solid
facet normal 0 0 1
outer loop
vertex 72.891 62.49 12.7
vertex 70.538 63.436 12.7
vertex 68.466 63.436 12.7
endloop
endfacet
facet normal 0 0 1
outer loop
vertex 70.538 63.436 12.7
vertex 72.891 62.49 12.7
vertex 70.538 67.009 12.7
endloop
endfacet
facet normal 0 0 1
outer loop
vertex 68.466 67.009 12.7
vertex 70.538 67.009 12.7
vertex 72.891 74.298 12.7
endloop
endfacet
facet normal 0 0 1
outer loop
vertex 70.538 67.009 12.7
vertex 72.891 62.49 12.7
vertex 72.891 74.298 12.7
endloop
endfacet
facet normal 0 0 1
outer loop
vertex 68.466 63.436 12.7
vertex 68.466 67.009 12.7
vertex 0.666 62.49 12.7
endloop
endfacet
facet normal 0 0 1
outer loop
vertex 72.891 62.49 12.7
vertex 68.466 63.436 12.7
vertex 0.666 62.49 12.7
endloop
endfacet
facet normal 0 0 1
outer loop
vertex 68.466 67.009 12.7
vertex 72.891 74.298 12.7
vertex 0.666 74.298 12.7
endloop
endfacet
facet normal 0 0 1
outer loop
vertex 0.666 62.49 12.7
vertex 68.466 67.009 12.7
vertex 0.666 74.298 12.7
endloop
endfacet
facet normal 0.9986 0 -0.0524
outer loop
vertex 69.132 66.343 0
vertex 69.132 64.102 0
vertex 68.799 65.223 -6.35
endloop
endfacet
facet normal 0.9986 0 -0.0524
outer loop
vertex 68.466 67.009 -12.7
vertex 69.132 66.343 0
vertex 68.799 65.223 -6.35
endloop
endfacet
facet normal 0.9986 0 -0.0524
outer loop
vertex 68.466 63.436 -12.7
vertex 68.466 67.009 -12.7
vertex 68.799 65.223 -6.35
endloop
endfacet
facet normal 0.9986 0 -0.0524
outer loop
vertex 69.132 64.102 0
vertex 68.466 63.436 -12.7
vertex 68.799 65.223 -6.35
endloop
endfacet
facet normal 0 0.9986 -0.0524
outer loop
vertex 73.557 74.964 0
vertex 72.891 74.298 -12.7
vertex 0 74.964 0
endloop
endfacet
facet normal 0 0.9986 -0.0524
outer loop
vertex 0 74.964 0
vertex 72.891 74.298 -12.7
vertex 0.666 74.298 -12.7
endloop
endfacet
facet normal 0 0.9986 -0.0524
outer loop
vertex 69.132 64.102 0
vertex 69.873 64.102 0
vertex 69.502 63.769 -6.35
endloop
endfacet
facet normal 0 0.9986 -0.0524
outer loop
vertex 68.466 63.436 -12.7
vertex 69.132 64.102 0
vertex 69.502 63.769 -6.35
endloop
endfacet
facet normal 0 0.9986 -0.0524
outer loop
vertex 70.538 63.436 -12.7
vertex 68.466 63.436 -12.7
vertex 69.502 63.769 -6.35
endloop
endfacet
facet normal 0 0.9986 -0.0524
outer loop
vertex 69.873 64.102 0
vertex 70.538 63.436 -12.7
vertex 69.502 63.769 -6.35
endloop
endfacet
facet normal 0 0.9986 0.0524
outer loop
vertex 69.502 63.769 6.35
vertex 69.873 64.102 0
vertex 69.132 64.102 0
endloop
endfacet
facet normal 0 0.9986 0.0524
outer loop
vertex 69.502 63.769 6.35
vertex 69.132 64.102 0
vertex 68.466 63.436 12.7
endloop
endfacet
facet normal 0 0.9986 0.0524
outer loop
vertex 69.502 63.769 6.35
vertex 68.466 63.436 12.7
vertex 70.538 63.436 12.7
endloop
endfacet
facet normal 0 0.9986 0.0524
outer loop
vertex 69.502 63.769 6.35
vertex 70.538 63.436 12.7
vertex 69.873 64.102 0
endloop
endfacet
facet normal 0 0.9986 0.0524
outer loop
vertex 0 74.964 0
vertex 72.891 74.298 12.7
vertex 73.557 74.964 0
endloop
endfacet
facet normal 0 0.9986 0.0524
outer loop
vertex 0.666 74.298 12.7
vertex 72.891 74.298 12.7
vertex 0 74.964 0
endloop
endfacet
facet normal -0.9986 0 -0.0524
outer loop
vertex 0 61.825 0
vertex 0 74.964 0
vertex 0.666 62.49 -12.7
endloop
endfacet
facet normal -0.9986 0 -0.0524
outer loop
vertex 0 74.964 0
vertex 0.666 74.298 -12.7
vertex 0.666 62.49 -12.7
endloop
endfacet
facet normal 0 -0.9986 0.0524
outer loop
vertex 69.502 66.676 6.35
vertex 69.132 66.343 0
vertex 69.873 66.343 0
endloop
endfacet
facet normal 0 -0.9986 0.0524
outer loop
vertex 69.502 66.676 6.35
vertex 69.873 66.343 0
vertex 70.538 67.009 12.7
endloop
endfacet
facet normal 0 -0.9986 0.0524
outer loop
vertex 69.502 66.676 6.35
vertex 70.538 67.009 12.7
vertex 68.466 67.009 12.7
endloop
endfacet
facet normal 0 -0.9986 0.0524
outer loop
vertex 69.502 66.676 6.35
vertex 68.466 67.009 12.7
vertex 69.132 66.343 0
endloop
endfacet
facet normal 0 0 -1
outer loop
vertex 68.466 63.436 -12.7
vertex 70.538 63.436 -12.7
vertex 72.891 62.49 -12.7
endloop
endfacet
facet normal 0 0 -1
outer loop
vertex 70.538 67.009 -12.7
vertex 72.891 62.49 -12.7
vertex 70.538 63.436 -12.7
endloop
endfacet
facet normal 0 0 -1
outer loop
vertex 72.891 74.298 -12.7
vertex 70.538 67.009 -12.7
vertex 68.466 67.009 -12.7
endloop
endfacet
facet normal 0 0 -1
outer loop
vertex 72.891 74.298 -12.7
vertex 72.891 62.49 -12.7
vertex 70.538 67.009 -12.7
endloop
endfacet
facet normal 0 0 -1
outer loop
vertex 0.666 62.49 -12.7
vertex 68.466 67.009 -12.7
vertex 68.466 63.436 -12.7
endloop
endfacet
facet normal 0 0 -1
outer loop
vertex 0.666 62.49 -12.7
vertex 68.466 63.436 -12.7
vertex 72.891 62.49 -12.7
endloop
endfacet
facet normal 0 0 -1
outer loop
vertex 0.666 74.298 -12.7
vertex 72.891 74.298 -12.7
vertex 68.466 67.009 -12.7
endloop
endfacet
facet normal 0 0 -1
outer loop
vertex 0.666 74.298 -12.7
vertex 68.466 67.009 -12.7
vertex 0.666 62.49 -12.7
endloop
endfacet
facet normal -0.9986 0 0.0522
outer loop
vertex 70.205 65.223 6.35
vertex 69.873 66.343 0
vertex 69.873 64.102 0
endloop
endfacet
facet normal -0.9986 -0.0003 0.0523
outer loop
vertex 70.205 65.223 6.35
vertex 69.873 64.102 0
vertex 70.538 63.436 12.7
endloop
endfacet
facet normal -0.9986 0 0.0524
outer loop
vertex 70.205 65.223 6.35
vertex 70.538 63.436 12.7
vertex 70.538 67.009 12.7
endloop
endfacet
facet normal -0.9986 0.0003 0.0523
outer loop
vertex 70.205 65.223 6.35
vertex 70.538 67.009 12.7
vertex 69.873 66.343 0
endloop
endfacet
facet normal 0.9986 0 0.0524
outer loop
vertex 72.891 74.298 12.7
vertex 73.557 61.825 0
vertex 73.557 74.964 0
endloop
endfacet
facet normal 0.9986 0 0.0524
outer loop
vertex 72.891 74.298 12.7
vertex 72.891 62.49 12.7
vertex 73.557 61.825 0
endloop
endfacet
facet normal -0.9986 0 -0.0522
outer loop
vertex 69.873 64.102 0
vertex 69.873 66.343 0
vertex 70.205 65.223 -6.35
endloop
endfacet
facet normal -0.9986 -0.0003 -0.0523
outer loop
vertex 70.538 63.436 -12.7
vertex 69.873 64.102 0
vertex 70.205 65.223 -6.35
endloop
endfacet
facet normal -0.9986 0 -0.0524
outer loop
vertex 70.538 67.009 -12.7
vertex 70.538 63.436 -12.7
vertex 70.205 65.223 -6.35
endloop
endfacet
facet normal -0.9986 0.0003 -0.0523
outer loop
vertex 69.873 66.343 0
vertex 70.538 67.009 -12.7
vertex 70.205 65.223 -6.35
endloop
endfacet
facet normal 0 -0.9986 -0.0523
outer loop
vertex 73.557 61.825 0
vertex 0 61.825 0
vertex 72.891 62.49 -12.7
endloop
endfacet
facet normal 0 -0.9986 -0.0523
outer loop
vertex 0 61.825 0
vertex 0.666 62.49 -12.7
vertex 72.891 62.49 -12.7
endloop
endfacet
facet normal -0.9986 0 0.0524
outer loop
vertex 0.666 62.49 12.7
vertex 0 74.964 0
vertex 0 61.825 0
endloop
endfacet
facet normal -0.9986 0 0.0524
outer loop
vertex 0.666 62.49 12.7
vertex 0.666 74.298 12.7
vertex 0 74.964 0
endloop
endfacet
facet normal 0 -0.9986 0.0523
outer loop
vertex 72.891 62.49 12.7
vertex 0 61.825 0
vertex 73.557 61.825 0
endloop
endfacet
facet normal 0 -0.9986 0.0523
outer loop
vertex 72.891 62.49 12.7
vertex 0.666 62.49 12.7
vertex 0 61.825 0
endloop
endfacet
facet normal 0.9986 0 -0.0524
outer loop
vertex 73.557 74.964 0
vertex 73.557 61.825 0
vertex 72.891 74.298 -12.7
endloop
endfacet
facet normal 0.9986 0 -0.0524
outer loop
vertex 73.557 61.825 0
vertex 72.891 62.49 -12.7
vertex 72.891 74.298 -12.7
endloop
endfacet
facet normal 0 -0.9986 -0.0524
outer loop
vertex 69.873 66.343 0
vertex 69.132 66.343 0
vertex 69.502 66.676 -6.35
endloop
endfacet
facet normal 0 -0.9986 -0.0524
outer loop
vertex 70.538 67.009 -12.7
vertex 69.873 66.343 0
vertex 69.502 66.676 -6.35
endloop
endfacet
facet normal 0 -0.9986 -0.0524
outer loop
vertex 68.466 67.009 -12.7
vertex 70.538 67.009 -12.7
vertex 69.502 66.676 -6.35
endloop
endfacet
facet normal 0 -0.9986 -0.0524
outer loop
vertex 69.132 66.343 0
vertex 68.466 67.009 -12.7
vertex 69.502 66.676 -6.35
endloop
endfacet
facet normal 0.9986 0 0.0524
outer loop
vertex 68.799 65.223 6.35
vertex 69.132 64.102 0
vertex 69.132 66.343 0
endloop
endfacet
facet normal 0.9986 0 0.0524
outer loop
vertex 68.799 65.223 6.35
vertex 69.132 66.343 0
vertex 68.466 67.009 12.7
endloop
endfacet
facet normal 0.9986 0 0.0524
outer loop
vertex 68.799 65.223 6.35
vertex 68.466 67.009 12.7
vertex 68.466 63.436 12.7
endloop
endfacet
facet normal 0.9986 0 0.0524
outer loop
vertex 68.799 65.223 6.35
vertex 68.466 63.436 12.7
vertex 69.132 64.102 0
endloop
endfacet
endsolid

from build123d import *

# Parameters (mm, degrees)
F0_W     = 0.7410570979
F0_H     = 2.2417232394
F1_DEPTH = 12.7
F1_TAPER = 3


with BuildPart() as f1:
    # F0 (on Top) → F1 (new body, symmetric)
    with BuildSketch(Plane.XY):
        Polygon((65.8400952816, 61.8246868253), (73.5567137599, 61.8246868253), (73.5567137599, 74.9637633562), (0, 74.9637633562), (0, 61.8246868253), align=None)
        with Locations((69.5021115243, 65.2226097882)):
            Rectangle(F0_W, F0_H, mode=Mode.SUBTRACT)
    extrude(amount=F1_DEPTH, both=True, taper=F1_TAPER)


solid = f1.part
